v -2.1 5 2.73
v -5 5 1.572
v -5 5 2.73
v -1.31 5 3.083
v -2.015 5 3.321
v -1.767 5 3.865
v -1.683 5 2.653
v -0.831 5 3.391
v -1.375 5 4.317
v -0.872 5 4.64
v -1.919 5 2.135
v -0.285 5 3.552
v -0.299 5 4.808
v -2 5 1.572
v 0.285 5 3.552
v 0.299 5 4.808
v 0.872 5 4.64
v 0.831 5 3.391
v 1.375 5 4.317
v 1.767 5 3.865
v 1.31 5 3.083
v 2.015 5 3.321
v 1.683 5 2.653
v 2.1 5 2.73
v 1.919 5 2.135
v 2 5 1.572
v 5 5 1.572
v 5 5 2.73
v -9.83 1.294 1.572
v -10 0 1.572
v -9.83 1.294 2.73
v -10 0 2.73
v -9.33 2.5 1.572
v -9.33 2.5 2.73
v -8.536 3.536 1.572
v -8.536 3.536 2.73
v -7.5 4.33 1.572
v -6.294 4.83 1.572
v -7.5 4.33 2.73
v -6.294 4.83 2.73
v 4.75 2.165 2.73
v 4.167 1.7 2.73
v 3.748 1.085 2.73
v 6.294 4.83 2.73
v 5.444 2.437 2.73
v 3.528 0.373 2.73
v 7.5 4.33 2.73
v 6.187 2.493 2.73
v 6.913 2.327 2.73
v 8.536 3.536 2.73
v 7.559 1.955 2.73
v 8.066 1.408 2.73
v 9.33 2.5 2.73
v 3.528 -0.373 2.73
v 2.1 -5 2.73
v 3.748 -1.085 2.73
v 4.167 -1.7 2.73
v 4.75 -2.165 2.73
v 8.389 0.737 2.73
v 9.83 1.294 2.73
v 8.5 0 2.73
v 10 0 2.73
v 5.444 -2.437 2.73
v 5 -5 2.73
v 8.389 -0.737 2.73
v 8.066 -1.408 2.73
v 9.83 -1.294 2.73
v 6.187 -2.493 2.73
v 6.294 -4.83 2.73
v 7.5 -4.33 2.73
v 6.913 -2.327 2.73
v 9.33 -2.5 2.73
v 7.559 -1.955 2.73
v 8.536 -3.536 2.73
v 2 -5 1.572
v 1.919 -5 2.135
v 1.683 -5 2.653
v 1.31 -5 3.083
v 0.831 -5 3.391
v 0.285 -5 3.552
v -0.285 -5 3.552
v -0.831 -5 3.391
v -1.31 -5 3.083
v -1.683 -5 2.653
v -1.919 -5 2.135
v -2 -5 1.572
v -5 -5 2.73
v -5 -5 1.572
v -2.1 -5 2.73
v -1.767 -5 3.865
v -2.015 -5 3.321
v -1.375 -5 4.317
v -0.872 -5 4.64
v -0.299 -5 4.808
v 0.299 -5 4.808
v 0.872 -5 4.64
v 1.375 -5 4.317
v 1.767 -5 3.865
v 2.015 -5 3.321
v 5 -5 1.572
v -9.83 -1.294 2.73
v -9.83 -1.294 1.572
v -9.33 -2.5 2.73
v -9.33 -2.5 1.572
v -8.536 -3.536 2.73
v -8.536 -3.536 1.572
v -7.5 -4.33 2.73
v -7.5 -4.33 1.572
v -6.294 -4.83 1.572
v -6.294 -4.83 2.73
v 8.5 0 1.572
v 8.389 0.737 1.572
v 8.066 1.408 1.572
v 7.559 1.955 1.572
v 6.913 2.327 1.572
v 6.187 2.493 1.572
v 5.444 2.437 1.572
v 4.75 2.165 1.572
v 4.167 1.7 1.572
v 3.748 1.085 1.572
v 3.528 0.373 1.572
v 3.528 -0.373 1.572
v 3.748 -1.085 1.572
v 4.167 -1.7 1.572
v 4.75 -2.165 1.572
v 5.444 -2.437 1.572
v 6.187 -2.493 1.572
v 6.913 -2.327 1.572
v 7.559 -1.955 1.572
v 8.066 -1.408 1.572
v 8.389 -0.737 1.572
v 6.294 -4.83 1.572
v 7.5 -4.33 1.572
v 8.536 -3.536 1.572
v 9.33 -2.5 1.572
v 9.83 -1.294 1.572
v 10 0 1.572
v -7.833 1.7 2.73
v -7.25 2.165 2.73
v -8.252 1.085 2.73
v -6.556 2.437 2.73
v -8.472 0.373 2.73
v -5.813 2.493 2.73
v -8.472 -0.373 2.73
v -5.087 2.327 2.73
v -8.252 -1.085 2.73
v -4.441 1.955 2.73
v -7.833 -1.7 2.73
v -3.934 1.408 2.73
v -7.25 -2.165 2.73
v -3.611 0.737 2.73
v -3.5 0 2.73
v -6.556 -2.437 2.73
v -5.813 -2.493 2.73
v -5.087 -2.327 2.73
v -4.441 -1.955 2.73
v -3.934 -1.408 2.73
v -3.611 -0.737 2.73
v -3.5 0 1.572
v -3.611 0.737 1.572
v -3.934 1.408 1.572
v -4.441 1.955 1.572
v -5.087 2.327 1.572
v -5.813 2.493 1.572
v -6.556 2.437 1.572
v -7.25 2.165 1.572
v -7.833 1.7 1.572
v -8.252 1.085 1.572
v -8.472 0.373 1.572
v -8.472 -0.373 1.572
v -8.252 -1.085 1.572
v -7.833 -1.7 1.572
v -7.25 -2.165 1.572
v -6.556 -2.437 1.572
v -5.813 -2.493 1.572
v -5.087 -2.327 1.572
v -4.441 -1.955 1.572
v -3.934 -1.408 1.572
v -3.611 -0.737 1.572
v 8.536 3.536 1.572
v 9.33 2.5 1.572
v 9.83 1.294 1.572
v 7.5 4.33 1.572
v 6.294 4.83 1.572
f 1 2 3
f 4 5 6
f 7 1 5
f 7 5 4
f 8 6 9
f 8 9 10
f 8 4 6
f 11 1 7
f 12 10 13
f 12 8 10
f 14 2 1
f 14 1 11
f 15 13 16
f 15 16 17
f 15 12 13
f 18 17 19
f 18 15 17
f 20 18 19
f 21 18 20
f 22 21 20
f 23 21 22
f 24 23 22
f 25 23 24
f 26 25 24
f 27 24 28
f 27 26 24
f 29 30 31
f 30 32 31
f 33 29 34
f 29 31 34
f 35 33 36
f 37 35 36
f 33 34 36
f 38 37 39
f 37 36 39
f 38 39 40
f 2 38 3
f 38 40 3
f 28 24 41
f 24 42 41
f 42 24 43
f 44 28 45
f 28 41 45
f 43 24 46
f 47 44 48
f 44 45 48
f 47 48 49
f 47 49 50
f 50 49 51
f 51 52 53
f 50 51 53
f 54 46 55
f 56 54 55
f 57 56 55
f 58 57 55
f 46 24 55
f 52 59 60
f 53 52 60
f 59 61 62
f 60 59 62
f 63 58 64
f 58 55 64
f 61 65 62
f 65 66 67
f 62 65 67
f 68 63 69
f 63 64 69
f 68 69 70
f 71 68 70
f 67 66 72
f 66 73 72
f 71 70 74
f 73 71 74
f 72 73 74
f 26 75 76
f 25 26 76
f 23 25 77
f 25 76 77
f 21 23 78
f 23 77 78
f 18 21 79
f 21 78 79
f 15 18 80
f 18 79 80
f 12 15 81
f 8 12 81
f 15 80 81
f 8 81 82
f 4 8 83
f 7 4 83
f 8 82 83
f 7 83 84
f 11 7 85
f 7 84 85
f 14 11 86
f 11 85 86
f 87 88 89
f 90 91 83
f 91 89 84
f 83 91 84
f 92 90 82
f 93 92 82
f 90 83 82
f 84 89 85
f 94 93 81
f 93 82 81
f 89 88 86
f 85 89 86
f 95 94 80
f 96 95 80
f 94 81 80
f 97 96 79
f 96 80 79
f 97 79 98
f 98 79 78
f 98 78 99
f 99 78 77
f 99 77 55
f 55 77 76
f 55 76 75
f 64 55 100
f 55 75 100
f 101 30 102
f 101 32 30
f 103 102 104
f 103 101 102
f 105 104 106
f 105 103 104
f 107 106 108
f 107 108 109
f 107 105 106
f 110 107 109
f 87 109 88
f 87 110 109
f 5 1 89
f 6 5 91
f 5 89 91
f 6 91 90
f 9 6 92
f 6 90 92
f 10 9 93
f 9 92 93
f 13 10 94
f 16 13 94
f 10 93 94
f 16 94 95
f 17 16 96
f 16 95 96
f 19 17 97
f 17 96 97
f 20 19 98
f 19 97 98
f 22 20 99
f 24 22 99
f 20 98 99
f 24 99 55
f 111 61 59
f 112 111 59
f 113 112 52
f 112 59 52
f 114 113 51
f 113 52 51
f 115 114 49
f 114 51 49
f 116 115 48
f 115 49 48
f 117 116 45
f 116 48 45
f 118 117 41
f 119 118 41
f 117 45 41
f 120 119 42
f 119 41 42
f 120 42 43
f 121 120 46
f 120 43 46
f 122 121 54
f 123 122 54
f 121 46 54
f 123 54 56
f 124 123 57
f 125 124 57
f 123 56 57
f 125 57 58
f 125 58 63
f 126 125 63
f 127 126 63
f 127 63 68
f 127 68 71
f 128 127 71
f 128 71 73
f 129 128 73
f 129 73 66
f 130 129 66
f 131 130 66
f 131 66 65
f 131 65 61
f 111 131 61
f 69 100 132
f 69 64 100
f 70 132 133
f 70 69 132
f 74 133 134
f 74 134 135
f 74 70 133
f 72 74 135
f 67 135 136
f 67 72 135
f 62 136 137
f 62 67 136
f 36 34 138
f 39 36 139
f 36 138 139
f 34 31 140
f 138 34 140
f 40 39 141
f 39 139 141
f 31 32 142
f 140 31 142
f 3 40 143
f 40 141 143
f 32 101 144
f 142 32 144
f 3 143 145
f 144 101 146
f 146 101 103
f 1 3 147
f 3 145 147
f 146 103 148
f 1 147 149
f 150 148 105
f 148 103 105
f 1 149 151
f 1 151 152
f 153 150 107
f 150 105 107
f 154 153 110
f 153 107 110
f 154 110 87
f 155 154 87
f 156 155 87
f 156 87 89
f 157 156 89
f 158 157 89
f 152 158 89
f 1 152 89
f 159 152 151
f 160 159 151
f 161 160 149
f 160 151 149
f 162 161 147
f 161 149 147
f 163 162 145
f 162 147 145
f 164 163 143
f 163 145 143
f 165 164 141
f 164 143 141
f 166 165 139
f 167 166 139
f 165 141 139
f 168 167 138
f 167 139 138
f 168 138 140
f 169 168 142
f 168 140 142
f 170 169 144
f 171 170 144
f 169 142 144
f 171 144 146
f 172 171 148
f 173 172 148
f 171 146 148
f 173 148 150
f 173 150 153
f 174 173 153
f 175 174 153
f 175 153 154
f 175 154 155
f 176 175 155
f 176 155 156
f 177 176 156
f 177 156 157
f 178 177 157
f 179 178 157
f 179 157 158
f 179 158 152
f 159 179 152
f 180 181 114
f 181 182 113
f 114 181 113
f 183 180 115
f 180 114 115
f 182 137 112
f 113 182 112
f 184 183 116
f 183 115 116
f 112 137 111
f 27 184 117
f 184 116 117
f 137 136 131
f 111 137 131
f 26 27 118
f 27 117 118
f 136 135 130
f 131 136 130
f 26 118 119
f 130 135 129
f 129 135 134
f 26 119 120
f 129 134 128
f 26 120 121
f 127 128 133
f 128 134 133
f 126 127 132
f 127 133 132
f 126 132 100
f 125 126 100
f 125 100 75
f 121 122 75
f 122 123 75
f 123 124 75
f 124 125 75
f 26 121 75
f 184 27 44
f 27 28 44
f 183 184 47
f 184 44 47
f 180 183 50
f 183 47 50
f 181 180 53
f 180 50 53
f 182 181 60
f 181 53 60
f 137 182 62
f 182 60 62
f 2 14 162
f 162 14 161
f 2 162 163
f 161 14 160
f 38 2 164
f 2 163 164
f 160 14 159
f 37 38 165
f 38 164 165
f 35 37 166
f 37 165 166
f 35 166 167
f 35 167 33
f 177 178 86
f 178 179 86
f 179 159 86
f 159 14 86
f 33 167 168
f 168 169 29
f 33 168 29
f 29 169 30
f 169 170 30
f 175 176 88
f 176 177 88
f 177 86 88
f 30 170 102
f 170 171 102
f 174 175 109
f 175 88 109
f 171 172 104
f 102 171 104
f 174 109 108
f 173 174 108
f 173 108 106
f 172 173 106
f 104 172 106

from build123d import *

# Parameters (mm, degrees)
SZKIC1_W                    = 20
SZKIC1_H                    = 10
DODANIE_WYCI_GNI_CIE1_DEPTH = 10
SZKIC2_R                    = 2.5
WYTNIJ_WYCI_GNI_CIE1_DEPTH  = 10
WYTNIJ_WYCI_GNI_CIE2_DEPTH  = 10
WYTNIJ_WYCI_GNI_CIE3_DEPTH  = 10
ZAOKR_GLENIE2_R             = 5


with BuildPart() as part:
    # Szkic1 → Dodanie-wyciągnięcie1 (new body)
    with BuildSketch(Plane.XY):
        Rectangle(SZKIC1_W, SZKIC1_H)
    extrude(amount=DODANIE_WYCI_GNI_CIE1_DEPTH)

    # Szkic2 → Wytnij-wyciągnięcie1 (cut)
    with BuildSketch(Plane.XY.offset(10)):
        with Locations((-6, 0)):
            Circle(SZKIC2_R)
        with Locations((6, 0)):
            Circle(SZKIC2_R)
    extrude(amount=-WYTNIJ_WYCI_GNI_CIE1_DEPTH, mode=Mode.SUBTRACT)

    # Szkic3 → Wytnij-wyciągnięcie2 (cut)
    with BuildSketch(Plane.XZ.offset(5)):
        with BuildLine():
            Line((-10, 10), (-10, 2.729686207))
            Line((-10, 2.729686207), (-2.1, 2.729686207))
            ThreePointArc((-2.1, 2.729686207), (0, 4.829686207), (2.1, 2.729686207))
            Line((2.1, 2.729686207), (10, 2.729686207))
            Line((10, 2.729686207), (10, 10))
            Line((10, 10), (-10, 10))
        make_face()
    extrude(amount=-WYTNIJ_WYCI_GNI_CIE2_DEPTH, mode=Mode.SUBTRACT)

    # Szkic3<3> → Wytnij-wyciągnięcie3 (cut)
    with BuildSketch(Plane.XZ.offset(5)):
        with BuildLine():
            Line((-2, 1.571944273), (-10, 1.571944273))
            Line((-10, 1.571944273), (-10, 0))
            Line((-10, 0), (10, 0))
            Line((10, 0), (10, 1.571944273))
            Line((10, 1.571944273), (2, 1.571944273))
            ThreePointArc((2, 1.571944273), (0, 3.571944273), (-2, 1.571944273))
        make_face()
    extrude(amount=-WYTNIJ_WYCI_GNI_CIE3_DEPTH, mode=Mode.SUBTRACT)

    # Zaokrąglenie2
    zaokr_glenie2_edges = [part.edges().sort_by_distance(p)[0] for p in [
        (10, 5, 2.15081524),
        (10, -5, 2.15081524),
        (-10, 5, 2.15081524),
        (-10, -5, 2.15081524),
    ]]
    fillet(zaokr_glenie2_edges, radius=ZAOKR_GLENIE2_R - 0.0001)  # a hair under: the kernel refuses the full size


solid = part.part
